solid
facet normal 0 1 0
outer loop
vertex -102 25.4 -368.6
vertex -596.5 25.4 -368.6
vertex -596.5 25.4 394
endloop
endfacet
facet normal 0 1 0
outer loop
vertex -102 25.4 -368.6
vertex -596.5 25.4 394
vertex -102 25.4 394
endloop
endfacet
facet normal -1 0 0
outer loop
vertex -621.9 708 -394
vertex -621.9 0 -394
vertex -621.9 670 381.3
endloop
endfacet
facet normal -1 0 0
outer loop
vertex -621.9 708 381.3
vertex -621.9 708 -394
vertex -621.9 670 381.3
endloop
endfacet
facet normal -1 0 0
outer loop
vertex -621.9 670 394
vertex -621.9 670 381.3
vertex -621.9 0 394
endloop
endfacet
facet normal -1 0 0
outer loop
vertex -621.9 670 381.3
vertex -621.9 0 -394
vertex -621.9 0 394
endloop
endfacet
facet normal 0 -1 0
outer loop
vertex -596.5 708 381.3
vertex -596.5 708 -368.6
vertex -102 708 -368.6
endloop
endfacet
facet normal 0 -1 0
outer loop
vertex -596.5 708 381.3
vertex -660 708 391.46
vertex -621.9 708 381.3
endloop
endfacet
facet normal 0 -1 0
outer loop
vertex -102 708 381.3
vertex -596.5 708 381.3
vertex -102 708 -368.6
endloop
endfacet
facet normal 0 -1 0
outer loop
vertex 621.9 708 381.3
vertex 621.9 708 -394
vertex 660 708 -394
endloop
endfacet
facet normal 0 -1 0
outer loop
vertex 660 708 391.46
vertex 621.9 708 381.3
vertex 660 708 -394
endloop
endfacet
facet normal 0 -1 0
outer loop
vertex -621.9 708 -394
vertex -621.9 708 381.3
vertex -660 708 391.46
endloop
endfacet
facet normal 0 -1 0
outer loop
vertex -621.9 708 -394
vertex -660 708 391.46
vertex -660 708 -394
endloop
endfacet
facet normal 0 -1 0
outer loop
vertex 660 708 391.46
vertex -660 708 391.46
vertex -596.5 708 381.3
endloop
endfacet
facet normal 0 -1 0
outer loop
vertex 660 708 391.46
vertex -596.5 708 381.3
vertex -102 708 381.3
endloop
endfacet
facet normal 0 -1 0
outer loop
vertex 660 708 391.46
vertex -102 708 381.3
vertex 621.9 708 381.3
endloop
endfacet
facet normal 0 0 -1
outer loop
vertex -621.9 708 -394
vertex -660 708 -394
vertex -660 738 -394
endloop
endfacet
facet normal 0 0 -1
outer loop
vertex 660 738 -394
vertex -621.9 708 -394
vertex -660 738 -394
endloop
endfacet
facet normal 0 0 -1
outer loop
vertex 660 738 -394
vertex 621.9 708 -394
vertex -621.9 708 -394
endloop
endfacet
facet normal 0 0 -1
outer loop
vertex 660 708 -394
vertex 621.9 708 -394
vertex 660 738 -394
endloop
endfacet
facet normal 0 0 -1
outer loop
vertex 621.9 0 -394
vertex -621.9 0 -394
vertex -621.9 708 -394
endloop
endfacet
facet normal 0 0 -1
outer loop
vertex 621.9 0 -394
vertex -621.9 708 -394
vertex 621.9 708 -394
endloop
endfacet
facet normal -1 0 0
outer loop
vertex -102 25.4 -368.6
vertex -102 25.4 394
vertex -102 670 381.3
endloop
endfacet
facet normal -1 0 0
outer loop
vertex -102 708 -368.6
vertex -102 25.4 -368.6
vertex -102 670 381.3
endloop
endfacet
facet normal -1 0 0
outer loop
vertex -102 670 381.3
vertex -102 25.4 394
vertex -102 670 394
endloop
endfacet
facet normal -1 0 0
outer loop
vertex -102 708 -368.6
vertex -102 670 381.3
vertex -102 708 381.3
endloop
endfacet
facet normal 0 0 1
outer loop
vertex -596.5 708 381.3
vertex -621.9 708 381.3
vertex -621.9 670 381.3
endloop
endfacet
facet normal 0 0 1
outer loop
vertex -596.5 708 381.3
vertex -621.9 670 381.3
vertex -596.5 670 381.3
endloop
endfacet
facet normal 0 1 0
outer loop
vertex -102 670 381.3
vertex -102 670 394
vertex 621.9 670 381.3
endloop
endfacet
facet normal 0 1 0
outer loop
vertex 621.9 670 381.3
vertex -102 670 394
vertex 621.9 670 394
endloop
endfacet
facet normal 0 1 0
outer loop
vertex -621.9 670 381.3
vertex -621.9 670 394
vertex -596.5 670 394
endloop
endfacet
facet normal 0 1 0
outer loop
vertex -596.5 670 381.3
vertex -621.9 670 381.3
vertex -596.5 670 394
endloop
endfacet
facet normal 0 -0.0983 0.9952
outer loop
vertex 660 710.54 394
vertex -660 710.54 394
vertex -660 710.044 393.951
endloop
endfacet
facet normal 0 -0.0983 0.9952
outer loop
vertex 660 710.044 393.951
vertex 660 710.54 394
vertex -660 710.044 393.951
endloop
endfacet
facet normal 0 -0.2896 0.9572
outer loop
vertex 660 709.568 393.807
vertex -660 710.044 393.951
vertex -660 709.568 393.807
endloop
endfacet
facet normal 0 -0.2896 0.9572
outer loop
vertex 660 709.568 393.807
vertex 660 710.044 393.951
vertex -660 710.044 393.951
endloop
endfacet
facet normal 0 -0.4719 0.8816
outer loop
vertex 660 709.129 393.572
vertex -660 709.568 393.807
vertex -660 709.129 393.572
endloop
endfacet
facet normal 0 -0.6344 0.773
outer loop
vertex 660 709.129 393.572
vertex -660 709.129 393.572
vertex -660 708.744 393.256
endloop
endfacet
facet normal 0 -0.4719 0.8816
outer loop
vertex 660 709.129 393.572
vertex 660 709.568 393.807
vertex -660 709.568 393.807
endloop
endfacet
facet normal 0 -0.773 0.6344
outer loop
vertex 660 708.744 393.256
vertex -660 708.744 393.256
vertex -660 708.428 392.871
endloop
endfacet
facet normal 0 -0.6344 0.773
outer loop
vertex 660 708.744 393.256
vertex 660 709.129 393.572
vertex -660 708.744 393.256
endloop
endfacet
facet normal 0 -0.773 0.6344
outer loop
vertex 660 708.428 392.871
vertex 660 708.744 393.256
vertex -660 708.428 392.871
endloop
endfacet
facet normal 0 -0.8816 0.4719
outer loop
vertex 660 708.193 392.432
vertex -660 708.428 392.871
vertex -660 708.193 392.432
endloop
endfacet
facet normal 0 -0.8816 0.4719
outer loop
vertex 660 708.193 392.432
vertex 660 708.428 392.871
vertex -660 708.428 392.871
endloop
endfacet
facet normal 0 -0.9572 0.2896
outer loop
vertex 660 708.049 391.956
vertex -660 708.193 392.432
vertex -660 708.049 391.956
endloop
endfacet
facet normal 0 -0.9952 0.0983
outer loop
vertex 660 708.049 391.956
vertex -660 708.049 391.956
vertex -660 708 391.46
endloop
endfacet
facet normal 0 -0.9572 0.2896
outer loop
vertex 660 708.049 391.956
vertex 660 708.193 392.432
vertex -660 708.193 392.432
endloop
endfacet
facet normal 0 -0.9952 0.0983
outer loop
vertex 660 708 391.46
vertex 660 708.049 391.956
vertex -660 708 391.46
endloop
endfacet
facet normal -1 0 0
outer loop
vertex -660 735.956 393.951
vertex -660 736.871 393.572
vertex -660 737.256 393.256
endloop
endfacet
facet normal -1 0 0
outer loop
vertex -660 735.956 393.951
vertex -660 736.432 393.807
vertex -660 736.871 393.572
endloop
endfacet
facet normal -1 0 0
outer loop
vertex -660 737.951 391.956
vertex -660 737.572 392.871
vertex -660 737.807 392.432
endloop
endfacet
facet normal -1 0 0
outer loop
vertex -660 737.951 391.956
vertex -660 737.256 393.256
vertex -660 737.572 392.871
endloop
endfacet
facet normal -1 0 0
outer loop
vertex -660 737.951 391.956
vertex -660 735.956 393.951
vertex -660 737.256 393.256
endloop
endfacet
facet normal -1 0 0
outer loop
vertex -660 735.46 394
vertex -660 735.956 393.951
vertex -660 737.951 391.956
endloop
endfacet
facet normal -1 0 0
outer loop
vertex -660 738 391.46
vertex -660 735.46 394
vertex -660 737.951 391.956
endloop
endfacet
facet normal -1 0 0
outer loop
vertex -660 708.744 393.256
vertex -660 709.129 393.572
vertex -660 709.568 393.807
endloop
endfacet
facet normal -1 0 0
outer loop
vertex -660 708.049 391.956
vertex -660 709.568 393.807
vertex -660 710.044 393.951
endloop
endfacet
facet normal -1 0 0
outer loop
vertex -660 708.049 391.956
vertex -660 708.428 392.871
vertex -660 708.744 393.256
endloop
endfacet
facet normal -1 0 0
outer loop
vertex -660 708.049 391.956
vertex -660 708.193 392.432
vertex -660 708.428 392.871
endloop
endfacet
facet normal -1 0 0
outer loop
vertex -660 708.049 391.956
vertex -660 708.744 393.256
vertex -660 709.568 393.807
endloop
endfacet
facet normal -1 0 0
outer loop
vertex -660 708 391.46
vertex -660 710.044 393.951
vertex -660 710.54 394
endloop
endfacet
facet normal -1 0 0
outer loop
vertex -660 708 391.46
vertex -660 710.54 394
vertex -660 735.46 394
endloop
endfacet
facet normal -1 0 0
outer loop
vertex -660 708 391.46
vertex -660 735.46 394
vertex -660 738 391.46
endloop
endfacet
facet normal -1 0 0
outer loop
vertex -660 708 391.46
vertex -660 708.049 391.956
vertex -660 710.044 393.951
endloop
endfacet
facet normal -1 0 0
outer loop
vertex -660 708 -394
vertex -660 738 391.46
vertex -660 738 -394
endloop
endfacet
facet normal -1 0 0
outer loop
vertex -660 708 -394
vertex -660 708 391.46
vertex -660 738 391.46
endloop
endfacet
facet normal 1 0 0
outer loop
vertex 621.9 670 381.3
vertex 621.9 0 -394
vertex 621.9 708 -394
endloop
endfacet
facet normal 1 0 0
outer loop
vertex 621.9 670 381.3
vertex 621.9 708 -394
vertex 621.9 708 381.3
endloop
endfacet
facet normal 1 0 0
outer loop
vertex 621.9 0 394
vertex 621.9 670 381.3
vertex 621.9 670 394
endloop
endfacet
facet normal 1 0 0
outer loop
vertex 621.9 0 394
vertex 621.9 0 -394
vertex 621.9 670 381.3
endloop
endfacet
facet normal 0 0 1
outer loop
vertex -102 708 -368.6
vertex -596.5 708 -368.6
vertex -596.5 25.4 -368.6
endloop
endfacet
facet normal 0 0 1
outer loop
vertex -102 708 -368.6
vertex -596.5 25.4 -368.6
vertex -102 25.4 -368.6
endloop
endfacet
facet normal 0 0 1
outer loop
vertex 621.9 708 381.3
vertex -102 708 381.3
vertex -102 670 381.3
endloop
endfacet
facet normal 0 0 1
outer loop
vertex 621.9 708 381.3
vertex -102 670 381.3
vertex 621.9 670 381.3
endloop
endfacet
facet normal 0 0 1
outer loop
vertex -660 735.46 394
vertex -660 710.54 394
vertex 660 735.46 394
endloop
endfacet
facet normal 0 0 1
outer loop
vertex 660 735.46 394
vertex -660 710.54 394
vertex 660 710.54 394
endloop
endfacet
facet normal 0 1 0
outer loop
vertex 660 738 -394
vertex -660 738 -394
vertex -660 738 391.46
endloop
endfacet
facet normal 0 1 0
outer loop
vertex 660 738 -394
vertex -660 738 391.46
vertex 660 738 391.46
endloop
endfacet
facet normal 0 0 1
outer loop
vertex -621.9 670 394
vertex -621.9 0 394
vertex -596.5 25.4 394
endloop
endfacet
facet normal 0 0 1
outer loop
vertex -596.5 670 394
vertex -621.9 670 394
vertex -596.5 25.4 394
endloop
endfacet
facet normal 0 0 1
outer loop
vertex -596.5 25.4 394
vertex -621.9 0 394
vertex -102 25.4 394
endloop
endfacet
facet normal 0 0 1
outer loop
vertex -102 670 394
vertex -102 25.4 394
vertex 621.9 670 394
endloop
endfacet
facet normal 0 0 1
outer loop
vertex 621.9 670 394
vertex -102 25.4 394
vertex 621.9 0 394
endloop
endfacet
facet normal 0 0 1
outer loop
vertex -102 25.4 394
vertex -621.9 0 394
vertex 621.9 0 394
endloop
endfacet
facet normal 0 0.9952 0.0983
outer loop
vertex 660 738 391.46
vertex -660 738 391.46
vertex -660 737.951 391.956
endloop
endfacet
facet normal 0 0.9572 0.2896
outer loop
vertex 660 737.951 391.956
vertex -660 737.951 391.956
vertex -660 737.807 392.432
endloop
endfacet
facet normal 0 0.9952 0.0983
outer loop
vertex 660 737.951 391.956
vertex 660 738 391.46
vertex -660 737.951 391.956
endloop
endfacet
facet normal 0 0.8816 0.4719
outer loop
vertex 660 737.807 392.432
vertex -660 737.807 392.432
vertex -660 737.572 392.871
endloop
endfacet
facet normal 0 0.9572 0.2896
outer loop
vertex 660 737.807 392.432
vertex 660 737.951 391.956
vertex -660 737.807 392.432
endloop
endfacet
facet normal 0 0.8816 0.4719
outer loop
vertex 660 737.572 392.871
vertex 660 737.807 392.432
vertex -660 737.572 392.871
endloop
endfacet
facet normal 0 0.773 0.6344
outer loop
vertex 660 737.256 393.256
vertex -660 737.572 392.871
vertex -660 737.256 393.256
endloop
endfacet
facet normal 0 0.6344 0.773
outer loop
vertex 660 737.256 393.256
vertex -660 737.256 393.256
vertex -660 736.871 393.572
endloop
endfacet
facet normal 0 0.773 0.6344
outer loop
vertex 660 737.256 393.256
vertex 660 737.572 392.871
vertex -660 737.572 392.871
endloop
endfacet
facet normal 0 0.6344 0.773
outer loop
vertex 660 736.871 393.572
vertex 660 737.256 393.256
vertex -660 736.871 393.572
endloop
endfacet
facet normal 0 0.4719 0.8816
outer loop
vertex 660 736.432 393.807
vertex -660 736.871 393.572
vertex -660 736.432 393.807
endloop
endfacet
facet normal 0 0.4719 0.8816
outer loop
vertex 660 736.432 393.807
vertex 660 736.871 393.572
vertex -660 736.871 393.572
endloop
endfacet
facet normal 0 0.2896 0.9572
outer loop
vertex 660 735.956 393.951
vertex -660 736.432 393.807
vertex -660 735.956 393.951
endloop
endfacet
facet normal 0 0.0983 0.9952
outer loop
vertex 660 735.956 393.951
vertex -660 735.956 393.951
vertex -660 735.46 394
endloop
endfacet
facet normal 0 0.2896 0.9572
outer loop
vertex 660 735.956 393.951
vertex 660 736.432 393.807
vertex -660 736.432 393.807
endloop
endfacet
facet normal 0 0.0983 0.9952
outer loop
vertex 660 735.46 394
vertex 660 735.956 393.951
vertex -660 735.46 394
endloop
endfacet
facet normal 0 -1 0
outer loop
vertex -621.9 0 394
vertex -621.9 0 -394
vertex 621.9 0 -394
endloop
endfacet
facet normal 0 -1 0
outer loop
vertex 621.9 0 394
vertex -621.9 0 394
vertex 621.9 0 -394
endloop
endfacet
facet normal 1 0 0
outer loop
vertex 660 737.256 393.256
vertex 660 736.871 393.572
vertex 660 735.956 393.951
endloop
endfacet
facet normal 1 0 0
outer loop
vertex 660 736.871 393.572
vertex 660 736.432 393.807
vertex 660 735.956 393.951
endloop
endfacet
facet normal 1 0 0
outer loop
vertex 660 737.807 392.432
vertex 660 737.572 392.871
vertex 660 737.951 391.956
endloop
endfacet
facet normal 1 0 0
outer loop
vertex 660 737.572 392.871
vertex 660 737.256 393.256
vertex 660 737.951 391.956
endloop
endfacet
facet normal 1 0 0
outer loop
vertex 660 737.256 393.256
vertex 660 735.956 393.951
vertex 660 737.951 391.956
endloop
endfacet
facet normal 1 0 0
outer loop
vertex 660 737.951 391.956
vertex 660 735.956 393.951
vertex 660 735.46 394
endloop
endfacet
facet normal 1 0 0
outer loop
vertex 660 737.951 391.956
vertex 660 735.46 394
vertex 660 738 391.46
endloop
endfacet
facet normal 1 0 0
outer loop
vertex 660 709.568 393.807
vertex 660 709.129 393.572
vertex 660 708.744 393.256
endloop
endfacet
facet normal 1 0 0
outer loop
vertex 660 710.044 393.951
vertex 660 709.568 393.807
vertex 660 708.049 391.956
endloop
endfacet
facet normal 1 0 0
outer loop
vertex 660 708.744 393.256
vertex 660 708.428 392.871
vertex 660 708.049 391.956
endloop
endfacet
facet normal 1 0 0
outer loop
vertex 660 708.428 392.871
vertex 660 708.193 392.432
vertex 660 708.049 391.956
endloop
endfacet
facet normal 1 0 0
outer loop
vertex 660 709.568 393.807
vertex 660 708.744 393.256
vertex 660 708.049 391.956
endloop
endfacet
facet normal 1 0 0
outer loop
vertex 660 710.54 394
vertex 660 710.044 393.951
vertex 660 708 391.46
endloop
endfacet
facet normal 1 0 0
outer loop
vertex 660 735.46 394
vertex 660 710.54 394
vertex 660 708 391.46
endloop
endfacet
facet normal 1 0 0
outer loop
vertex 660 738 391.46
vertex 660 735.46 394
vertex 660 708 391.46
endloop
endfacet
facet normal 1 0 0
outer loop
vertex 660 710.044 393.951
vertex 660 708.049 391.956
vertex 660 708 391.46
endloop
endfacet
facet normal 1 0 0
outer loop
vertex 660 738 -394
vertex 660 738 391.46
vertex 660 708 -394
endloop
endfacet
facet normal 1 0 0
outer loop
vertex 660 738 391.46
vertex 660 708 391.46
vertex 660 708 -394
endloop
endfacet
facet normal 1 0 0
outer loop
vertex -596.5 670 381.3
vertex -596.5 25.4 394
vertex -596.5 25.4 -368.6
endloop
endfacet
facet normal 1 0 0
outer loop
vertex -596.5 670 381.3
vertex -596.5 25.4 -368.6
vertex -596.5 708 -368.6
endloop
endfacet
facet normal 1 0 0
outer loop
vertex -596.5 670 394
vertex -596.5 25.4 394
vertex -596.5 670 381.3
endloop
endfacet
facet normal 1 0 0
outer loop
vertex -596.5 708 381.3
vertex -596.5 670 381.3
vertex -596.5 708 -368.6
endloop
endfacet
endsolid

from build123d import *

# Parameters (mm, degrees)
SKETCH1_W           = 1320
SKETCH1_H           = 788
BOSS_EXTRUDE1_DEPTH = 738
SKETCH5_W           = 1320
SKETCH5_H           = 38
CUT_EXTRUDE1_DEPTH  = 12.7
FILLET2_R           = 2.54
CUT_EXTRUDE2_REACH  = 1067.589
SKETCH6_W           = 38.1
SKETCH6_H           = 788
SKETCH8_W           = 494.5
SKETCH8_H           = 682.6
CUT_EXTRUDE3_DEPTH  = 762.6


with BuildPart() as part:
    # Sketch1 → Boss-Extrude1 (new body)
    with BuildSketch(Plane(origin=(0, 0, 0), x_dir=(1, 0, 0), z_dir=(0, 1, 0))):
        Rectangle(SKETCH1_W, SKETCH1_H)
    extrude(amount=BOSS_EXTRUDE1_DEPTH)

    # Sketch5 → Cut-Extrude1 (cut)
    with BuildSketch(Plane.XY.offset(394)):
        with Locations((0, 689)):
            Rectangle(SKETCH5_W, SKETCH5_H)
    extrude(amount=-CUT_EXTRUDE1_DEPTH, mode=Mode.SUBTRACT)

    # Fillet2
    fillet2_edges = [part.edges().sort_by_distance(p)[0] for p in [
        (0, 708, 394),
        (0, 738, 394),
    ]]
    fillet(fillet2_edges, radius=FILLET2_R)

    # Cut-Extrude2: up to this face of the body (flat: up to its plane)
    cut_extrude2_end = Plane(part.part.faces().sort_by_distance((0, 708, 386.38))[0])
    # Sketch6 → Cut-Extrude2 (cut, up to the picked face)
    with BuildSketch(Plane.XZ, mode=Mode.PRIVATE) as cut_extrude2_sk1:
        with Locations((640.95, 0)):
            Rectangle(SKETCH6_W, SKETCH6_H)
    cut_extrude2_tool1 = split(extrude(cut_extrude2_sk1.sketch, amount=-CUT_EXTRUDE2_REACH, mode=Mode.PRIVATE), bisect_by=cut_extrude2_end, keep=Keep.BOTH, mode=Mode.PRIVATE)
    # Sketch6 → Cut-Extrude2 (cut, up to the picked face)
    with BuildSketch(Plane.XZ, mode=Mode.PRIVATE) as cut_extrude2_sk2:
        with Locations((-640.95, 0)):
            Rectangle(SKETCH6_W, SKETCH6_H)
    cut_extrude2_tool2 = split(extrude(cut_extrude2_sk2.sketch, amount=-CUT_EXTRUDE2_REACH, mode=Mode.PRIVATE), bisect_by=cut_extrude2_end, keep=Keep.BOTH, mode=Mode.PRIVATE)
    add(cut_extrude2_tool1.solids().sort_by(Axis((640.95, 0, 0), (0, 1, 0)))[0], mode=Mode.SUBTRACT)
    add(cut_extrude2_tool2.solids().sort_by(Axis((-640.95, 0, 0), (0, 1, 0)))[0], mode=Mode.SUBTRACT)

    # Sketch8 → Cut-Extrude3 (cut)
    with BuildSketch(Plane.XY.offset(394)):
        with Locations((-349.25, 366.7)):
            Rectangle(SKETCH8_W, SKETCH8_H)
    extrude(amount=-CUT_EXTRUDE3_DEPTH, mode=Mode.SUBTRACT)


solid = part.part
